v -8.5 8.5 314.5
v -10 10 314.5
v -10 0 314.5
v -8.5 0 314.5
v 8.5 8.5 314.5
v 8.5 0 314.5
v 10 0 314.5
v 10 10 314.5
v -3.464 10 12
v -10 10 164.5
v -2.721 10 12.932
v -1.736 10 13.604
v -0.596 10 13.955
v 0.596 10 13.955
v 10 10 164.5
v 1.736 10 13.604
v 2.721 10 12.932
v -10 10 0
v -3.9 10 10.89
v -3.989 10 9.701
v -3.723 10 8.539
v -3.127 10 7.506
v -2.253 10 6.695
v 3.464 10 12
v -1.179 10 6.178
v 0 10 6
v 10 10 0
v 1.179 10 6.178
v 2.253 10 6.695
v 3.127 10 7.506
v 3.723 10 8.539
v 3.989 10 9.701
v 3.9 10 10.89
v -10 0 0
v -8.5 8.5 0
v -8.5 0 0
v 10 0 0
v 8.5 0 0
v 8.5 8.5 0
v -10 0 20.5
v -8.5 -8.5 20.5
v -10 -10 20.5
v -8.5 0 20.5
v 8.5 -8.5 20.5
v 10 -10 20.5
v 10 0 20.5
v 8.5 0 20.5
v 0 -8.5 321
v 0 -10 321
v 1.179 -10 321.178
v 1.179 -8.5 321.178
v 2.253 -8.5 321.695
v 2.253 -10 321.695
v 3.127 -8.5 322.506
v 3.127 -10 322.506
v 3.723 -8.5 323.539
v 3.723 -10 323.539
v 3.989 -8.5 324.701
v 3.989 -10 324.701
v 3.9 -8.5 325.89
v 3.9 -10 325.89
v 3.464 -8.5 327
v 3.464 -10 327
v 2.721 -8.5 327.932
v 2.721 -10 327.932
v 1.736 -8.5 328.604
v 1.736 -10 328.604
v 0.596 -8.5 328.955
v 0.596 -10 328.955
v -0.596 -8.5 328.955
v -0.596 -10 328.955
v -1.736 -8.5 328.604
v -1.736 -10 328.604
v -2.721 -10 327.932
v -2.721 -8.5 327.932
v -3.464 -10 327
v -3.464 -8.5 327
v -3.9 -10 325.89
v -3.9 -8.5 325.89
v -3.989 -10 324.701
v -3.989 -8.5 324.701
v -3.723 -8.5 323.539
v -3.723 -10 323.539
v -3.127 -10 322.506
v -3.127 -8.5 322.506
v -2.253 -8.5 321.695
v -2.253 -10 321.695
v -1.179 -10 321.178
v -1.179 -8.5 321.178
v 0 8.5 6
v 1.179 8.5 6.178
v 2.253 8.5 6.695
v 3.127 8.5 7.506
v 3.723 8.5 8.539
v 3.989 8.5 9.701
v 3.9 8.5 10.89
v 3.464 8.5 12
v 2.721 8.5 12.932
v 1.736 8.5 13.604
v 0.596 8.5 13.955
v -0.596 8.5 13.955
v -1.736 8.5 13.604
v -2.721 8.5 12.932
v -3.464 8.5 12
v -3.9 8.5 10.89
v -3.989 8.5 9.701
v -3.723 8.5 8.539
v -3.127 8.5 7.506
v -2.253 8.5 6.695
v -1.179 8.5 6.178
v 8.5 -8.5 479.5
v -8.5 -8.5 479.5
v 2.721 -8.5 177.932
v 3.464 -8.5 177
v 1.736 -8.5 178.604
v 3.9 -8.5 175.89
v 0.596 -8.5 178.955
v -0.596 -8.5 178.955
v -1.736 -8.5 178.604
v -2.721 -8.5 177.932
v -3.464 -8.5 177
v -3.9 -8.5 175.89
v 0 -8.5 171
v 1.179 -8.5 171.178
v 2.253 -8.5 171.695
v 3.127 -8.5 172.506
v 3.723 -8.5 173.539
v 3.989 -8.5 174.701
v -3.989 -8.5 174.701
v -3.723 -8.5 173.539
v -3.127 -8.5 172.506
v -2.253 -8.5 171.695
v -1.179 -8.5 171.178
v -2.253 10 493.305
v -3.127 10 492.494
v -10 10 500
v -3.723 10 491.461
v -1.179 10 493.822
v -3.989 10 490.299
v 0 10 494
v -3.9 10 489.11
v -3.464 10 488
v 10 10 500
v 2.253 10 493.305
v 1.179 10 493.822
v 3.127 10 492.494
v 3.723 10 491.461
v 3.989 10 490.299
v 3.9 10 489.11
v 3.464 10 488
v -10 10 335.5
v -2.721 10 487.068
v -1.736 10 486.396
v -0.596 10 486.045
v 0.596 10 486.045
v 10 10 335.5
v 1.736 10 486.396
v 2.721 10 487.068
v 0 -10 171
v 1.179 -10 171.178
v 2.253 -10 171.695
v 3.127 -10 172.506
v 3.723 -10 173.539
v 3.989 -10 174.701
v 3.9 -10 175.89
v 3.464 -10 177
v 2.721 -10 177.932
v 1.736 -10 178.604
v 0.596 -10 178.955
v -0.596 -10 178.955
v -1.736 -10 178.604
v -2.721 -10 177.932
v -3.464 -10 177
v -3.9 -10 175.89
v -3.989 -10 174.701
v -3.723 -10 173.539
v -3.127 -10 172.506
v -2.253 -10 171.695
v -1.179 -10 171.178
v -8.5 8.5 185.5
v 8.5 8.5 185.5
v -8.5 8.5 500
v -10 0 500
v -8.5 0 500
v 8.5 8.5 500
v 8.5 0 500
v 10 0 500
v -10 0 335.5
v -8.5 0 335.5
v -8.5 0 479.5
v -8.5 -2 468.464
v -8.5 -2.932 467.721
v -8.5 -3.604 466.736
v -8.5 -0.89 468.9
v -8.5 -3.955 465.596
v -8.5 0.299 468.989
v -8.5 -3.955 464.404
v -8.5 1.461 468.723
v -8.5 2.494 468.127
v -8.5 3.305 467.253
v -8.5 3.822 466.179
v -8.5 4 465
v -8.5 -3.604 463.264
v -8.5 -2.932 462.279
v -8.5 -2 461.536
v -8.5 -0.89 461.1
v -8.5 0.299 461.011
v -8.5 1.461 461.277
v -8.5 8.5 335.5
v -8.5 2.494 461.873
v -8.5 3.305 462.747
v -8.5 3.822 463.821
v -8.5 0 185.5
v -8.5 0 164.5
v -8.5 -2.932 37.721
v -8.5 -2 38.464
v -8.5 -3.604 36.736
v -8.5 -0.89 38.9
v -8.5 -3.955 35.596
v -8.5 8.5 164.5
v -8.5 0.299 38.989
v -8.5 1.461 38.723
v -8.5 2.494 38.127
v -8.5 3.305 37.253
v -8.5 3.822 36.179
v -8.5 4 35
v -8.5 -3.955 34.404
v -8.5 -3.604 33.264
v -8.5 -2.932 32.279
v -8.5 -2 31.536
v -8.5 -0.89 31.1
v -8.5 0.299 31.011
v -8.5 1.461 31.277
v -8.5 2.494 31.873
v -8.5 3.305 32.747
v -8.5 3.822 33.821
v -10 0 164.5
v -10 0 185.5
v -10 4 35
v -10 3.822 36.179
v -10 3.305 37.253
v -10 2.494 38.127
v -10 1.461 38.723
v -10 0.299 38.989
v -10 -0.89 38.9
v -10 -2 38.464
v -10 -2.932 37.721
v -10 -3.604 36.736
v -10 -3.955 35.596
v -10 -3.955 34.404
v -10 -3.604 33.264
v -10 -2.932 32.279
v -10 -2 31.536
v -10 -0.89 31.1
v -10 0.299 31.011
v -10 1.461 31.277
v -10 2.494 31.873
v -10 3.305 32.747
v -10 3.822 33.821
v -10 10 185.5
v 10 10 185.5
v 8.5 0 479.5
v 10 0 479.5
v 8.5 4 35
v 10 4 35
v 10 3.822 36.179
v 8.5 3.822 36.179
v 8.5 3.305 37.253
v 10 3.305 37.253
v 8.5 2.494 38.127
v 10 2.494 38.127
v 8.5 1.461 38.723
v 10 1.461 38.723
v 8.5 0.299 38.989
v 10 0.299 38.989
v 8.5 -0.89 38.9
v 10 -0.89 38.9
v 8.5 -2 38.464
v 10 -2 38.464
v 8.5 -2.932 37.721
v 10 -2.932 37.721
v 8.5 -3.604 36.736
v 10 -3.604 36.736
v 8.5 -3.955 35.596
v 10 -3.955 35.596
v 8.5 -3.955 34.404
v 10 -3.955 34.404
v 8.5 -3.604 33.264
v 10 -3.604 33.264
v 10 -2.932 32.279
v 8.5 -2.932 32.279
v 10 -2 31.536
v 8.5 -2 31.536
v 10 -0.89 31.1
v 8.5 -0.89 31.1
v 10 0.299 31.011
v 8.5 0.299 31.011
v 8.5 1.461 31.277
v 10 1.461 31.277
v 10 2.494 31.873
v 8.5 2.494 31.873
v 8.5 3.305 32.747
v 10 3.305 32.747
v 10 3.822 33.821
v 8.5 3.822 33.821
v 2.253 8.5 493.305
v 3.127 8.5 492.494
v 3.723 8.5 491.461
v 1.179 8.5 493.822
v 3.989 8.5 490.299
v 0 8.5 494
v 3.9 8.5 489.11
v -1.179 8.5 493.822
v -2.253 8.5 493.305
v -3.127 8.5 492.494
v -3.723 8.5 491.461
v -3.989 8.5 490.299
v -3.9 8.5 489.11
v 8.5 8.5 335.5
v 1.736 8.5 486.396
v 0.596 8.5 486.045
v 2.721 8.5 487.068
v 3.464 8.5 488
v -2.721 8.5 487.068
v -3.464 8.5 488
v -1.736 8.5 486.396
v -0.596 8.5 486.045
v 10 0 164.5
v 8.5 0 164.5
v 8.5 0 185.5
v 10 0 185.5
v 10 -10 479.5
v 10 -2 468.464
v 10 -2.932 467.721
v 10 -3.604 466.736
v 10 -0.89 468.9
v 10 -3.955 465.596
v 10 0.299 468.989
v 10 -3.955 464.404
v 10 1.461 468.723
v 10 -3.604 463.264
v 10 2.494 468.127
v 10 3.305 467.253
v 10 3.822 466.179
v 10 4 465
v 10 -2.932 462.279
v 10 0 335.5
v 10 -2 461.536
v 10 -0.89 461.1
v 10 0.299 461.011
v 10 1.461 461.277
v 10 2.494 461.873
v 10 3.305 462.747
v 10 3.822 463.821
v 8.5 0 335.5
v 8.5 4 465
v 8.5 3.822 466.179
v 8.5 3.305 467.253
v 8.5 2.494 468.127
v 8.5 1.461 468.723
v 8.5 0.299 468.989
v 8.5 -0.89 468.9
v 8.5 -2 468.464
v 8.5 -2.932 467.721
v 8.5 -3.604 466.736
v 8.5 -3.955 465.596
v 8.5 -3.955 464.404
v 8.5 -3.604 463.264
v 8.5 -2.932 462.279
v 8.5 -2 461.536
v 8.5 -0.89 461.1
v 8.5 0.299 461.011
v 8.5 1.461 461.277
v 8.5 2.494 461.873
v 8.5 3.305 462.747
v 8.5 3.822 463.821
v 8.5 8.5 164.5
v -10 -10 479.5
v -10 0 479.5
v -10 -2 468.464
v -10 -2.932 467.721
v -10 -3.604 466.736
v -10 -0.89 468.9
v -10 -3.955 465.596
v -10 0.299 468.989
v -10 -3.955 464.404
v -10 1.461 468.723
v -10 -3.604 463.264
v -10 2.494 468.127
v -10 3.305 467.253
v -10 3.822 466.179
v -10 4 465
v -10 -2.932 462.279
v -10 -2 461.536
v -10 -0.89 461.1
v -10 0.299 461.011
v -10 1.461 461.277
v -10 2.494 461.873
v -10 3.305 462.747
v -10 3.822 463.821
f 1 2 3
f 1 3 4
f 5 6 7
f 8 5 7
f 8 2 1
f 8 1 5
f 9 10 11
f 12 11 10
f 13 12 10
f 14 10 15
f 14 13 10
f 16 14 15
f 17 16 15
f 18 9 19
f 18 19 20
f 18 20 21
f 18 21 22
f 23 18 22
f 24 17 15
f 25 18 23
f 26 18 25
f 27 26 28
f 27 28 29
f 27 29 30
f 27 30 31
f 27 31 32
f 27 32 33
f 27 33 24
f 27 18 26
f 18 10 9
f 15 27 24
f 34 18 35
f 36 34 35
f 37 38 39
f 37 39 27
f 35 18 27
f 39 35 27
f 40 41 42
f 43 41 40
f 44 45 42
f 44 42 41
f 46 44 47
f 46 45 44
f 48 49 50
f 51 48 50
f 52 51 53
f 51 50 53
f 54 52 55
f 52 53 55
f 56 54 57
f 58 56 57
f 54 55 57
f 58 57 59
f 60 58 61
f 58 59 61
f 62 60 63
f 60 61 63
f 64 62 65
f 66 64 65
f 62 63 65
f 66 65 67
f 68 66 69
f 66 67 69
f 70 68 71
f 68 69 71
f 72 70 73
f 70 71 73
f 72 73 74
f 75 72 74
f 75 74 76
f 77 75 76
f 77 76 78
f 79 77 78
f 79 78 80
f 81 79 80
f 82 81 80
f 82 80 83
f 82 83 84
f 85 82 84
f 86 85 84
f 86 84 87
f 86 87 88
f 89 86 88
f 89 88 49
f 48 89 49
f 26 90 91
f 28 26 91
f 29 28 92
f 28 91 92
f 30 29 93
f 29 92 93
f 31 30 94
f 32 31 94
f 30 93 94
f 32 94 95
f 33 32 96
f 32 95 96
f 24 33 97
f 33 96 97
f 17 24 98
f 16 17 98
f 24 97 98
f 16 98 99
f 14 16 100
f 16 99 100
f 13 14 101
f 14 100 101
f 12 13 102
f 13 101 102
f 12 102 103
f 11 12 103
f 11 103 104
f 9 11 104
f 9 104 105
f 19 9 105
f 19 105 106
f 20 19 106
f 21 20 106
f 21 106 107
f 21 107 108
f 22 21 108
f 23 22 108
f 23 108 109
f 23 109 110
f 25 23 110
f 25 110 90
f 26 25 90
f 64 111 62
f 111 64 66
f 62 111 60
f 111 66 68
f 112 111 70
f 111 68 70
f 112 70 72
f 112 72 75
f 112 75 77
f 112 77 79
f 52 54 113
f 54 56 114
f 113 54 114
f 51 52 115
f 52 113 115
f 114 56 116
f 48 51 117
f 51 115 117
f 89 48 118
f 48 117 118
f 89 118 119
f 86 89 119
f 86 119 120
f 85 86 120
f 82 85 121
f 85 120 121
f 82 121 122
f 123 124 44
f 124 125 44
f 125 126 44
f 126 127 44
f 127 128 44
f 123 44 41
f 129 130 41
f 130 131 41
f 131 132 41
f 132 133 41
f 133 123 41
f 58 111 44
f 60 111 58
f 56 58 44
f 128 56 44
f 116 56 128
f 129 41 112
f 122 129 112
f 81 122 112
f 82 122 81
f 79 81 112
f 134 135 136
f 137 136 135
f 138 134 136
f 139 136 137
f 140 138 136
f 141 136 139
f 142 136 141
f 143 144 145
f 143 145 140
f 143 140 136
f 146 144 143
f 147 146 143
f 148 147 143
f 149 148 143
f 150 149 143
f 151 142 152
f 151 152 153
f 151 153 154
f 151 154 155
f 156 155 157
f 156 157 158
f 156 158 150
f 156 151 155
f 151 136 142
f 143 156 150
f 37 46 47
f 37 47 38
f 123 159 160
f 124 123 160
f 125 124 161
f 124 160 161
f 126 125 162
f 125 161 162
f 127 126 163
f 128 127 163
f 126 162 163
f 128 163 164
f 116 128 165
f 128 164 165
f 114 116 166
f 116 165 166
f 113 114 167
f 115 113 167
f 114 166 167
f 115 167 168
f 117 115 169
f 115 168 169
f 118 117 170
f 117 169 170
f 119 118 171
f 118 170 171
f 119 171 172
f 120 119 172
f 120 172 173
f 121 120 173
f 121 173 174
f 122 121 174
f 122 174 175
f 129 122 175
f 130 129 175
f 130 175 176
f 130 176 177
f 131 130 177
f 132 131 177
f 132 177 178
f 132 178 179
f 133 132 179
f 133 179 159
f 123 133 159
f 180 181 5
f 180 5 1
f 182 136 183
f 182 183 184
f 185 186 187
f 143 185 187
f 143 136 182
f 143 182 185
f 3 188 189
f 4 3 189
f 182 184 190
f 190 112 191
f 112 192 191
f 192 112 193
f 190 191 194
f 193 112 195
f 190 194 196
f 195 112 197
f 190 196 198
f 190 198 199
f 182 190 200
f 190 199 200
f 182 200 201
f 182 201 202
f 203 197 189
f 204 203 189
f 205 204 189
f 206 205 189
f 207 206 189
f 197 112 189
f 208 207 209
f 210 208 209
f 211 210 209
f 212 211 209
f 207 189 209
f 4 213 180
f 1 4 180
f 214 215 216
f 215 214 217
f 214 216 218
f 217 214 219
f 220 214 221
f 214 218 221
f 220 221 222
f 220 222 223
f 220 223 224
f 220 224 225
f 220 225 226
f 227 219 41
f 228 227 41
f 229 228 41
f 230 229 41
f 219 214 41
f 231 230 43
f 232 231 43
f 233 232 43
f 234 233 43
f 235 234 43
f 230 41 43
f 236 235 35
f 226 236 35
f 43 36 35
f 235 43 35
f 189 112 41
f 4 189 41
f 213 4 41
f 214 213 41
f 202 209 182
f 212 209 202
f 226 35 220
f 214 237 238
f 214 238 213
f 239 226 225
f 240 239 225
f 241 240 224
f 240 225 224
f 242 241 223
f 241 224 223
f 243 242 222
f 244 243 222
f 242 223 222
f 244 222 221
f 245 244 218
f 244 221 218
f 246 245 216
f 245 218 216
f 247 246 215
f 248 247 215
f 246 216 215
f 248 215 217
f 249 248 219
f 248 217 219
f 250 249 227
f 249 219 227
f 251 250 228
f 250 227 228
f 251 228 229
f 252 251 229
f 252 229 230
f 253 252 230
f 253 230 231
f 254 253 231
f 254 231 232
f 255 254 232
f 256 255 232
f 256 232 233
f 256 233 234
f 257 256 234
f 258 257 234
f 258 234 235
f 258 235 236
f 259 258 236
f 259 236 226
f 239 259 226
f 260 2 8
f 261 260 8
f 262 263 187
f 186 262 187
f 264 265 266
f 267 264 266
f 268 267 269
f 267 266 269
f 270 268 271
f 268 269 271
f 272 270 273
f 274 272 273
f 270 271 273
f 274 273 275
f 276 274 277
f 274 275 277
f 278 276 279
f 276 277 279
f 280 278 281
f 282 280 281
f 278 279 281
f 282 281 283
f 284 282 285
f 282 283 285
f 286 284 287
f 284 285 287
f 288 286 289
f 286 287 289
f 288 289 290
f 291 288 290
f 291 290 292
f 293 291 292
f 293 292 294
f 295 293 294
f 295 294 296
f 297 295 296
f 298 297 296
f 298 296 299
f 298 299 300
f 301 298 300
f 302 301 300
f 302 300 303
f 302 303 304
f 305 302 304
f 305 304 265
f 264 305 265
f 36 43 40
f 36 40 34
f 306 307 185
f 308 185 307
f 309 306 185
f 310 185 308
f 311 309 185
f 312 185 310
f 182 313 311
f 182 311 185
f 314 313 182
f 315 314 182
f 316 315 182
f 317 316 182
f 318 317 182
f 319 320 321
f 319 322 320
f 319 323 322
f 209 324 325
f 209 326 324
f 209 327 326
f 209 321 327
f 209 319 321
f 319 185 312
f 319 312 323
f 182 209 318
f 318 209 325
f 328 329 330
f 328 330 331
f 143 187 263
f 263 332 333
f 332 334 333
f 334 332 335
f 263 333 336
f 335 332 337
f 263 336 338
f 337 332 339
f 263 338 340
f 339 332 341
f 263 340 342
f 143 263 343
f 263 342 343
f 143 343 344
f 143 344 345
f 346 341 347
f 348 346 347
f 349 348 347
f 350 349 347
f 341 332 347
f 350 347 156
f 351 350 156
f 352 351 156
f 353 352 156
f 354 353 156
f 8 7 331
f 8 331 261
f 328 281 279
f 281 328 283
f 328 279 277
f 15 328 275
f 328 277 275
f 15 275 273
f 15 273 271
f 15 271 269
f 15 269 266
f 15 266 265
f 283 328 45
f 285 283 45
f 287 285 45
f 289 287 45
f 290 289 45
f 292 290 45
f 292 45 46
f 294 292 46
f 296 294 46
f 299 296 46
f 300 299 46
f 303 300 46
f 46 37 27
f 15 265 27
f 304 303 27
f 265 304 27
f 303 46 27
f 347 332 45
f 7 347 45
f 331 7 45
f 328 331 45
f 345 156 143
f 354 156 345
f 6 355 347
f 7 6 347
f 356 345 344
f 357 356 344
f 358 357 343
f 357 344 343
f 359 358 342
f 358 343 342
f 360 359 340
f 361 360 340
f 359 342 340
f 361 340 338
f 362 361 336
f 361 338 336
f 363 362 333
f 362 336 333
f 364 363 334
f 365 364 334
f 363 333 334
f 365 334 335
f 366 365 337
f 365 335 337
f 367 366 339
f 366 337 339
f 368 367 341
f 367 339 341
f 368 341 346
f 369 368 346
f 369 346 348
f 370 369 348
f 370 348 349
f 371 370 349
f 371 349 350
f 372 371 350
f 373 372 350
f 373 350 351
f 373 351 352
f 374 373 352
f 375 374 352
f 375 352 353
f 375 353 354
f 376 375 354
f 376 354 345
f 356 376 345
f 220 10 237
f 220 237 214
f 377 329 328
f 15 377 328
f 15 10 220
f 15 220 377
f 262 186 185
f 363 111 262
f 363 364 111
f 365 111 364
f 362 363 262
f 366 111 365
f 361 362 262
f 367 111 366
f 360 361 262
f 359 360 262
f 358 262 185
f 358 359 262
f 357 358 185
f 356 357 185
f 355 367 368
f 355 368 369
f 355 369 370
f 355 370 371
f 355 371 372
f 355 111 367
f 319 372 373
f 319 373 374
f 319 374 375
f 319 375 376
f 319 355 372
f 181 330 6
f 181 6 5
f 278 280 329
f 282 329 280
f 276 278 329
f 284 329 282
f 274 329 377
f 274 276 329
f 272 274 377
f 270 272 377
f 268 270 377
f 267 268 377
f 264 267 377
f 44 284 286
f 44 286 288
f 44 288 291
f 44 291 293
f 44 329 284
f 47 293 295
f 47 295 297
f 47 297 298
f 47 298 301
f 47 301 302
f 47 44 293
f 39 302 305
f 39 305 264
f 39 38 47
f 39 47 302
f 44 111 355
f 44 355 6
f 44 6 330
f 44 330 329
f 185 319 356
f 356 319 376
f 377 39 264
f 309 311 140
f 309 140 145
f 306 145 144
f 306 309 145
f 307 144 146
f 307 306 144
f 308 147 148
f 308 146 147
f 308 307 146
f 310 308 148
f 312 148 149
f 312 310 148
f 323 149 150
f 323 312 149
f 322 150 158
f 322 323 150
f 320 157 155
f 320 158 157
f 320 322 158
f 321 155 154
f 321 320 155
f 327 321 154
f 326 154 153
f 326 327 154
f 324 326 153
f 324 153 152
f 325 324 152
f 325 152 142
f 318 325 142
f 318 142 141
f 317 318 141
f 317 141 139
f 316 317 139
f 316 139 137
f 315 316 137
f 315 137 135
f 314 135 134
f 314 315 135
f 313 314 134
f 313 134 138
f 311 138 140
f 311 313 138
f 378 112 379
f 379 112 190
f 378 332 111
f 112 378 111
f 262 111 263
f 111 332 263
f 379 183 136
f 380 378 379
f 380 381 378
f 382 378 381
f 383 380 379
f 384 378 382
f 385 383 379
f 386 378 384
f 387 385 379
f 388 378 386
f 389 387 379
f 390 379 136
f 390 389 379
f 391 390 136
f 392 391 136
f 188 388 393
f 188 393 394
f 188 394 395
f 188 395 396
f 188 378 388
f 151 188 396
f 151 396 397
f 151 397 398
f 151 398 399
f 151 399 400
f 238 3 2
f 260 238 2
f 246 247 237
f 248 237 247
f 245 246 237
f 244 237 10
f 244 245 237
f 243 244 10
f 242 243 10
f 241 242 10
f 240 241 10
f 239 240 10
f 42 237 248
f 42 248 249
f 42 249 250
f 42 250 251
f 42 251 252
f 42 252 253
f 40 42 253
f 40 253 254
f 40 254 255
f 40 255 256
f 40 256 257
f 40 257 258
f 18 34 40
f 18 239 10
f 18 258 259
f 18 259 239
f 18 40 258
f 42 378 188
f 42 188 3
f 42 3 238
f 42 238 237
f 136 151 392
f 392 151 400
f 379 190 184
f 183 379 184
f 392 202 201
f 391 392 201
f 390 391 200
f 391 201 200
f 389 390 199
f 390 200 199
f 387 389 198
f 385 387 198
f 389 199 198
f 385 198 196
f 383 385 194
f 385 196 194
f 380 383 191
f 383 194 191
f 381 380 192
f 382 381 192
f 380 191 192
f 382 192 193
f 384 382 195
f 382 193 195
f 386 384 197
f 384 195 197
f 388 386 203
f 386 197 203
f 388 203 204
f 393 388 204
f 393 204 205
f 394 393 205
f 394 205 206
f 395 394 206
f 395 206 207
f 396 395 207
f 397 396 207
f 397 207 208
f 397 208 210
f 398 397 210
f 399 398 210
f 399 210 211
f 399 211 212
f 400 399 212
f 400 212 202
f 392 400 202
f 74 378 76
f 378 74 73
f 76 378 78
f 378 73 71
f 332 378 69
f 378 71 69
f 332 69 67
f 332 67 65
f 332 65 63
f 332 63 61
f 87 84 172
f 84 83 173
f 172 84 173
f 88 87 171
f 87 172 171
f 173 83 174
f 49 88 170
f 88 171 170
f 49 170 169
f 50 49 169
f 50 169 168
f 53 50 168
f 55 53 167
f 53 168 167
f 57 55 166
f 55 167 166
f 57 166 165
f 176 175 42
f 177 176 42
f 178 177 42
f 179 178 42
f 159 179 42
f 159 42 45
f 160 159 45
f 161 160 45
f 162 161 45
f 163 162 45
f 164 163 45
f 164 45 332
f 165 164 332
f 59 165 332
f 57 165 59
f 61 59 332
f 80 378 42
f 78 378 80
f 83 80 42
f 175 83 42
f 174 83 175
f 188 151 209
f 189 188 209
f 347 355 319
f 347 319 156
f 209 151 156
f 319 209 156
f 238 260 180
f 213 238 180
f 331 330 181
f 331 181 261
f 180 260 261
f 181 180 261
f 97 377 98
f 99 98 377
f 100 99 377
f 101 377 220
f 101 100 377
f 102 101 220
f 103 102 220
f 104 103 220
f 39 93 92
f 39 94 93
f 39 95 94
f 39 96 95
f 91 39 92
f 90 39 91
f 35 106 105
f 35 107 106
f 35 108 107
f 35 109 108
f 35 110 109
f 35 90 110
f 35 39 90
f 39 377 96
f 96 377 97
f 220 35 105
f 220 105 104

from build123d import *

# Parameters (mm, degrees)
SKETCH_1_W          = 20
SKETCH_1_H          = 20
EXTRUDE_1_DEPTH     = 500
SKETCH_2_W          = 20
SKETCH_2_H          = 10
CUT_EXTRUDE_1_DEPTH = 10.5
SKETCH_3_R          = 4
CUT_EXTRUDE_2_DEPTH = 21
SKETCH_4_W          = 20.5
SKETCH_4_H          = 10
CUT_EXTRUDE_5_DEPTH = 21
SKETCH_5_R          = 4
CUT_EXTRUDE_4_DEPTH = 21
SKETCH_6_R          = 4
CUT_EXTRUDE_6_DEPTH = 501.49975025
SKETCH_7_W          = 17
SKETCH_7_H          = 17
CUT_EXTRUDE_7_DEPTH = 501.199960016


with BuildPart() as part:
    # ｽｹｯﾁ1 → ﾎﾞｽ - 押し出し1 (new body)
    with BuildSketch(Plane.XY):
        Rectangle(SKETCH_1_W, SKETCH_1_H)
    extrude(amount=EXTRUDE_1_DEPTH)

    # ｽｹｯﾁ2 → ｶｯﾄ - 押し出し1 (cut, symmetric)
    with BuildSketch(Plane.XY.offset(325)):
        with Locations((0, 5)):
            Rectangle(SKETCH_2_W, SKETCH_2_H)
    cut_extrude_1 = extrude(amount=CUT_EXTRUDE_1_DEPTH, both=True, mode=Mode.SUBTRACT)

    # ﾐﾗｰ1: ｶｯﾄ - 押し出し1 across plane
    add(cut_extrude_1.mirror(Plane.XY.offset(250)), mode=Mode.SUBTRACT)

    # ｽｹｯﾁ3 → ｶｯﾄ - 押し出し2 (cut)
    with BuildSketch(Plane.XZ.offset(10)):
        with Locations(Location((0, 325, 0), (0, 0, 270))):
            Circle(SKETCH_3_R)
        with Locations(Location((0, 175, 0), (0, 0, 270))):
            Circle(SKETCH_3_R)
    extrude(amount=-CUT_EXTRUDE_2_DEPTH, mode=Mode.SUBTRACT)

    # ｽｹｯﾁ4 → ｶｯﾄ - 押し出し5 (cut)
    with BuildSketch(Plane(origin=(10, 0, 0), x_dir=(0, 0, -1), z_dir=(1, 0, 0))):
        with Locations((-10.25, -5)):
            Rectangle(SKETCH_4_W, SKETCH_4_H)
    cut_extrude_5 = extrude(amount=-CUT_EXTRUDE_5_DEPTH, mode=Mode.SUBTRACT)

    # ｽｹｯﾁ5 → ｶｯﾄ - 押し出し4 (cut)
    with BuildSketch(Plane.XZ.offset(10)):
        with Locations(Location((0, 10, 0), (0, 0, 270))):
            Circle(SKETCH_5_R)
        with Locations((0, 510.5)):
            Circle(SKETCH_5_R)
    cut_extrude_4 = extrude(amount=-CUT_EXTRUDE_4_DEPTH, mode=Mode.SUBTRACT)

    # ﾐﾗｰ3: ｶｯﾄ - 押し出し5 across plane
    add(cut_extrude_5.mirror(Plane.XY.offset(250)), mode=Mode.SUBTRACT)

    # ﾐﾗｰ4: ｶｯﾄ - 押し出し4 across plane
    add(cut_extrude_4.mirror(Plane.XY.offset(250)), mode=Mode.SUBTRACT)

    # ｽｹｯﾁ6 → ｶｯﾄ - 押し出し6 (cut, through all)
    with BuildSketch(Plane(origin=(10, 0, 0), x_dir=(0, 0, -1), z_dir=(1, 0, 0))):
        with Locations(Location((-35, 0, 0), (0, 0, 90))):
            Circle(SKETCH_6_R)
        with Locations(Location((-465, 0, 0), (0, 0, 90))):
            Circle(SKETCH_6_R)
    extrude(amount=-CUT_EXTRUDE_6_DEPTH, mode=Mode.SUBTRACT)

    # ｽｹｯﾁ7 → ｶｯﾄ - 押し出し7 (cut, through all)
    with BuildSketch(Plane(origin=(0, 0, 0), x_dir=(-1, 0, 0), z_dir=(0, 0, -1))):
        Rectangle(SKETCH_7_W, SKETCH_7_H)
    extrude(amount=-CUT_EXTRUDE_7_DEPTH, mode=Mode.SUBTRACT)


solid = part.part
